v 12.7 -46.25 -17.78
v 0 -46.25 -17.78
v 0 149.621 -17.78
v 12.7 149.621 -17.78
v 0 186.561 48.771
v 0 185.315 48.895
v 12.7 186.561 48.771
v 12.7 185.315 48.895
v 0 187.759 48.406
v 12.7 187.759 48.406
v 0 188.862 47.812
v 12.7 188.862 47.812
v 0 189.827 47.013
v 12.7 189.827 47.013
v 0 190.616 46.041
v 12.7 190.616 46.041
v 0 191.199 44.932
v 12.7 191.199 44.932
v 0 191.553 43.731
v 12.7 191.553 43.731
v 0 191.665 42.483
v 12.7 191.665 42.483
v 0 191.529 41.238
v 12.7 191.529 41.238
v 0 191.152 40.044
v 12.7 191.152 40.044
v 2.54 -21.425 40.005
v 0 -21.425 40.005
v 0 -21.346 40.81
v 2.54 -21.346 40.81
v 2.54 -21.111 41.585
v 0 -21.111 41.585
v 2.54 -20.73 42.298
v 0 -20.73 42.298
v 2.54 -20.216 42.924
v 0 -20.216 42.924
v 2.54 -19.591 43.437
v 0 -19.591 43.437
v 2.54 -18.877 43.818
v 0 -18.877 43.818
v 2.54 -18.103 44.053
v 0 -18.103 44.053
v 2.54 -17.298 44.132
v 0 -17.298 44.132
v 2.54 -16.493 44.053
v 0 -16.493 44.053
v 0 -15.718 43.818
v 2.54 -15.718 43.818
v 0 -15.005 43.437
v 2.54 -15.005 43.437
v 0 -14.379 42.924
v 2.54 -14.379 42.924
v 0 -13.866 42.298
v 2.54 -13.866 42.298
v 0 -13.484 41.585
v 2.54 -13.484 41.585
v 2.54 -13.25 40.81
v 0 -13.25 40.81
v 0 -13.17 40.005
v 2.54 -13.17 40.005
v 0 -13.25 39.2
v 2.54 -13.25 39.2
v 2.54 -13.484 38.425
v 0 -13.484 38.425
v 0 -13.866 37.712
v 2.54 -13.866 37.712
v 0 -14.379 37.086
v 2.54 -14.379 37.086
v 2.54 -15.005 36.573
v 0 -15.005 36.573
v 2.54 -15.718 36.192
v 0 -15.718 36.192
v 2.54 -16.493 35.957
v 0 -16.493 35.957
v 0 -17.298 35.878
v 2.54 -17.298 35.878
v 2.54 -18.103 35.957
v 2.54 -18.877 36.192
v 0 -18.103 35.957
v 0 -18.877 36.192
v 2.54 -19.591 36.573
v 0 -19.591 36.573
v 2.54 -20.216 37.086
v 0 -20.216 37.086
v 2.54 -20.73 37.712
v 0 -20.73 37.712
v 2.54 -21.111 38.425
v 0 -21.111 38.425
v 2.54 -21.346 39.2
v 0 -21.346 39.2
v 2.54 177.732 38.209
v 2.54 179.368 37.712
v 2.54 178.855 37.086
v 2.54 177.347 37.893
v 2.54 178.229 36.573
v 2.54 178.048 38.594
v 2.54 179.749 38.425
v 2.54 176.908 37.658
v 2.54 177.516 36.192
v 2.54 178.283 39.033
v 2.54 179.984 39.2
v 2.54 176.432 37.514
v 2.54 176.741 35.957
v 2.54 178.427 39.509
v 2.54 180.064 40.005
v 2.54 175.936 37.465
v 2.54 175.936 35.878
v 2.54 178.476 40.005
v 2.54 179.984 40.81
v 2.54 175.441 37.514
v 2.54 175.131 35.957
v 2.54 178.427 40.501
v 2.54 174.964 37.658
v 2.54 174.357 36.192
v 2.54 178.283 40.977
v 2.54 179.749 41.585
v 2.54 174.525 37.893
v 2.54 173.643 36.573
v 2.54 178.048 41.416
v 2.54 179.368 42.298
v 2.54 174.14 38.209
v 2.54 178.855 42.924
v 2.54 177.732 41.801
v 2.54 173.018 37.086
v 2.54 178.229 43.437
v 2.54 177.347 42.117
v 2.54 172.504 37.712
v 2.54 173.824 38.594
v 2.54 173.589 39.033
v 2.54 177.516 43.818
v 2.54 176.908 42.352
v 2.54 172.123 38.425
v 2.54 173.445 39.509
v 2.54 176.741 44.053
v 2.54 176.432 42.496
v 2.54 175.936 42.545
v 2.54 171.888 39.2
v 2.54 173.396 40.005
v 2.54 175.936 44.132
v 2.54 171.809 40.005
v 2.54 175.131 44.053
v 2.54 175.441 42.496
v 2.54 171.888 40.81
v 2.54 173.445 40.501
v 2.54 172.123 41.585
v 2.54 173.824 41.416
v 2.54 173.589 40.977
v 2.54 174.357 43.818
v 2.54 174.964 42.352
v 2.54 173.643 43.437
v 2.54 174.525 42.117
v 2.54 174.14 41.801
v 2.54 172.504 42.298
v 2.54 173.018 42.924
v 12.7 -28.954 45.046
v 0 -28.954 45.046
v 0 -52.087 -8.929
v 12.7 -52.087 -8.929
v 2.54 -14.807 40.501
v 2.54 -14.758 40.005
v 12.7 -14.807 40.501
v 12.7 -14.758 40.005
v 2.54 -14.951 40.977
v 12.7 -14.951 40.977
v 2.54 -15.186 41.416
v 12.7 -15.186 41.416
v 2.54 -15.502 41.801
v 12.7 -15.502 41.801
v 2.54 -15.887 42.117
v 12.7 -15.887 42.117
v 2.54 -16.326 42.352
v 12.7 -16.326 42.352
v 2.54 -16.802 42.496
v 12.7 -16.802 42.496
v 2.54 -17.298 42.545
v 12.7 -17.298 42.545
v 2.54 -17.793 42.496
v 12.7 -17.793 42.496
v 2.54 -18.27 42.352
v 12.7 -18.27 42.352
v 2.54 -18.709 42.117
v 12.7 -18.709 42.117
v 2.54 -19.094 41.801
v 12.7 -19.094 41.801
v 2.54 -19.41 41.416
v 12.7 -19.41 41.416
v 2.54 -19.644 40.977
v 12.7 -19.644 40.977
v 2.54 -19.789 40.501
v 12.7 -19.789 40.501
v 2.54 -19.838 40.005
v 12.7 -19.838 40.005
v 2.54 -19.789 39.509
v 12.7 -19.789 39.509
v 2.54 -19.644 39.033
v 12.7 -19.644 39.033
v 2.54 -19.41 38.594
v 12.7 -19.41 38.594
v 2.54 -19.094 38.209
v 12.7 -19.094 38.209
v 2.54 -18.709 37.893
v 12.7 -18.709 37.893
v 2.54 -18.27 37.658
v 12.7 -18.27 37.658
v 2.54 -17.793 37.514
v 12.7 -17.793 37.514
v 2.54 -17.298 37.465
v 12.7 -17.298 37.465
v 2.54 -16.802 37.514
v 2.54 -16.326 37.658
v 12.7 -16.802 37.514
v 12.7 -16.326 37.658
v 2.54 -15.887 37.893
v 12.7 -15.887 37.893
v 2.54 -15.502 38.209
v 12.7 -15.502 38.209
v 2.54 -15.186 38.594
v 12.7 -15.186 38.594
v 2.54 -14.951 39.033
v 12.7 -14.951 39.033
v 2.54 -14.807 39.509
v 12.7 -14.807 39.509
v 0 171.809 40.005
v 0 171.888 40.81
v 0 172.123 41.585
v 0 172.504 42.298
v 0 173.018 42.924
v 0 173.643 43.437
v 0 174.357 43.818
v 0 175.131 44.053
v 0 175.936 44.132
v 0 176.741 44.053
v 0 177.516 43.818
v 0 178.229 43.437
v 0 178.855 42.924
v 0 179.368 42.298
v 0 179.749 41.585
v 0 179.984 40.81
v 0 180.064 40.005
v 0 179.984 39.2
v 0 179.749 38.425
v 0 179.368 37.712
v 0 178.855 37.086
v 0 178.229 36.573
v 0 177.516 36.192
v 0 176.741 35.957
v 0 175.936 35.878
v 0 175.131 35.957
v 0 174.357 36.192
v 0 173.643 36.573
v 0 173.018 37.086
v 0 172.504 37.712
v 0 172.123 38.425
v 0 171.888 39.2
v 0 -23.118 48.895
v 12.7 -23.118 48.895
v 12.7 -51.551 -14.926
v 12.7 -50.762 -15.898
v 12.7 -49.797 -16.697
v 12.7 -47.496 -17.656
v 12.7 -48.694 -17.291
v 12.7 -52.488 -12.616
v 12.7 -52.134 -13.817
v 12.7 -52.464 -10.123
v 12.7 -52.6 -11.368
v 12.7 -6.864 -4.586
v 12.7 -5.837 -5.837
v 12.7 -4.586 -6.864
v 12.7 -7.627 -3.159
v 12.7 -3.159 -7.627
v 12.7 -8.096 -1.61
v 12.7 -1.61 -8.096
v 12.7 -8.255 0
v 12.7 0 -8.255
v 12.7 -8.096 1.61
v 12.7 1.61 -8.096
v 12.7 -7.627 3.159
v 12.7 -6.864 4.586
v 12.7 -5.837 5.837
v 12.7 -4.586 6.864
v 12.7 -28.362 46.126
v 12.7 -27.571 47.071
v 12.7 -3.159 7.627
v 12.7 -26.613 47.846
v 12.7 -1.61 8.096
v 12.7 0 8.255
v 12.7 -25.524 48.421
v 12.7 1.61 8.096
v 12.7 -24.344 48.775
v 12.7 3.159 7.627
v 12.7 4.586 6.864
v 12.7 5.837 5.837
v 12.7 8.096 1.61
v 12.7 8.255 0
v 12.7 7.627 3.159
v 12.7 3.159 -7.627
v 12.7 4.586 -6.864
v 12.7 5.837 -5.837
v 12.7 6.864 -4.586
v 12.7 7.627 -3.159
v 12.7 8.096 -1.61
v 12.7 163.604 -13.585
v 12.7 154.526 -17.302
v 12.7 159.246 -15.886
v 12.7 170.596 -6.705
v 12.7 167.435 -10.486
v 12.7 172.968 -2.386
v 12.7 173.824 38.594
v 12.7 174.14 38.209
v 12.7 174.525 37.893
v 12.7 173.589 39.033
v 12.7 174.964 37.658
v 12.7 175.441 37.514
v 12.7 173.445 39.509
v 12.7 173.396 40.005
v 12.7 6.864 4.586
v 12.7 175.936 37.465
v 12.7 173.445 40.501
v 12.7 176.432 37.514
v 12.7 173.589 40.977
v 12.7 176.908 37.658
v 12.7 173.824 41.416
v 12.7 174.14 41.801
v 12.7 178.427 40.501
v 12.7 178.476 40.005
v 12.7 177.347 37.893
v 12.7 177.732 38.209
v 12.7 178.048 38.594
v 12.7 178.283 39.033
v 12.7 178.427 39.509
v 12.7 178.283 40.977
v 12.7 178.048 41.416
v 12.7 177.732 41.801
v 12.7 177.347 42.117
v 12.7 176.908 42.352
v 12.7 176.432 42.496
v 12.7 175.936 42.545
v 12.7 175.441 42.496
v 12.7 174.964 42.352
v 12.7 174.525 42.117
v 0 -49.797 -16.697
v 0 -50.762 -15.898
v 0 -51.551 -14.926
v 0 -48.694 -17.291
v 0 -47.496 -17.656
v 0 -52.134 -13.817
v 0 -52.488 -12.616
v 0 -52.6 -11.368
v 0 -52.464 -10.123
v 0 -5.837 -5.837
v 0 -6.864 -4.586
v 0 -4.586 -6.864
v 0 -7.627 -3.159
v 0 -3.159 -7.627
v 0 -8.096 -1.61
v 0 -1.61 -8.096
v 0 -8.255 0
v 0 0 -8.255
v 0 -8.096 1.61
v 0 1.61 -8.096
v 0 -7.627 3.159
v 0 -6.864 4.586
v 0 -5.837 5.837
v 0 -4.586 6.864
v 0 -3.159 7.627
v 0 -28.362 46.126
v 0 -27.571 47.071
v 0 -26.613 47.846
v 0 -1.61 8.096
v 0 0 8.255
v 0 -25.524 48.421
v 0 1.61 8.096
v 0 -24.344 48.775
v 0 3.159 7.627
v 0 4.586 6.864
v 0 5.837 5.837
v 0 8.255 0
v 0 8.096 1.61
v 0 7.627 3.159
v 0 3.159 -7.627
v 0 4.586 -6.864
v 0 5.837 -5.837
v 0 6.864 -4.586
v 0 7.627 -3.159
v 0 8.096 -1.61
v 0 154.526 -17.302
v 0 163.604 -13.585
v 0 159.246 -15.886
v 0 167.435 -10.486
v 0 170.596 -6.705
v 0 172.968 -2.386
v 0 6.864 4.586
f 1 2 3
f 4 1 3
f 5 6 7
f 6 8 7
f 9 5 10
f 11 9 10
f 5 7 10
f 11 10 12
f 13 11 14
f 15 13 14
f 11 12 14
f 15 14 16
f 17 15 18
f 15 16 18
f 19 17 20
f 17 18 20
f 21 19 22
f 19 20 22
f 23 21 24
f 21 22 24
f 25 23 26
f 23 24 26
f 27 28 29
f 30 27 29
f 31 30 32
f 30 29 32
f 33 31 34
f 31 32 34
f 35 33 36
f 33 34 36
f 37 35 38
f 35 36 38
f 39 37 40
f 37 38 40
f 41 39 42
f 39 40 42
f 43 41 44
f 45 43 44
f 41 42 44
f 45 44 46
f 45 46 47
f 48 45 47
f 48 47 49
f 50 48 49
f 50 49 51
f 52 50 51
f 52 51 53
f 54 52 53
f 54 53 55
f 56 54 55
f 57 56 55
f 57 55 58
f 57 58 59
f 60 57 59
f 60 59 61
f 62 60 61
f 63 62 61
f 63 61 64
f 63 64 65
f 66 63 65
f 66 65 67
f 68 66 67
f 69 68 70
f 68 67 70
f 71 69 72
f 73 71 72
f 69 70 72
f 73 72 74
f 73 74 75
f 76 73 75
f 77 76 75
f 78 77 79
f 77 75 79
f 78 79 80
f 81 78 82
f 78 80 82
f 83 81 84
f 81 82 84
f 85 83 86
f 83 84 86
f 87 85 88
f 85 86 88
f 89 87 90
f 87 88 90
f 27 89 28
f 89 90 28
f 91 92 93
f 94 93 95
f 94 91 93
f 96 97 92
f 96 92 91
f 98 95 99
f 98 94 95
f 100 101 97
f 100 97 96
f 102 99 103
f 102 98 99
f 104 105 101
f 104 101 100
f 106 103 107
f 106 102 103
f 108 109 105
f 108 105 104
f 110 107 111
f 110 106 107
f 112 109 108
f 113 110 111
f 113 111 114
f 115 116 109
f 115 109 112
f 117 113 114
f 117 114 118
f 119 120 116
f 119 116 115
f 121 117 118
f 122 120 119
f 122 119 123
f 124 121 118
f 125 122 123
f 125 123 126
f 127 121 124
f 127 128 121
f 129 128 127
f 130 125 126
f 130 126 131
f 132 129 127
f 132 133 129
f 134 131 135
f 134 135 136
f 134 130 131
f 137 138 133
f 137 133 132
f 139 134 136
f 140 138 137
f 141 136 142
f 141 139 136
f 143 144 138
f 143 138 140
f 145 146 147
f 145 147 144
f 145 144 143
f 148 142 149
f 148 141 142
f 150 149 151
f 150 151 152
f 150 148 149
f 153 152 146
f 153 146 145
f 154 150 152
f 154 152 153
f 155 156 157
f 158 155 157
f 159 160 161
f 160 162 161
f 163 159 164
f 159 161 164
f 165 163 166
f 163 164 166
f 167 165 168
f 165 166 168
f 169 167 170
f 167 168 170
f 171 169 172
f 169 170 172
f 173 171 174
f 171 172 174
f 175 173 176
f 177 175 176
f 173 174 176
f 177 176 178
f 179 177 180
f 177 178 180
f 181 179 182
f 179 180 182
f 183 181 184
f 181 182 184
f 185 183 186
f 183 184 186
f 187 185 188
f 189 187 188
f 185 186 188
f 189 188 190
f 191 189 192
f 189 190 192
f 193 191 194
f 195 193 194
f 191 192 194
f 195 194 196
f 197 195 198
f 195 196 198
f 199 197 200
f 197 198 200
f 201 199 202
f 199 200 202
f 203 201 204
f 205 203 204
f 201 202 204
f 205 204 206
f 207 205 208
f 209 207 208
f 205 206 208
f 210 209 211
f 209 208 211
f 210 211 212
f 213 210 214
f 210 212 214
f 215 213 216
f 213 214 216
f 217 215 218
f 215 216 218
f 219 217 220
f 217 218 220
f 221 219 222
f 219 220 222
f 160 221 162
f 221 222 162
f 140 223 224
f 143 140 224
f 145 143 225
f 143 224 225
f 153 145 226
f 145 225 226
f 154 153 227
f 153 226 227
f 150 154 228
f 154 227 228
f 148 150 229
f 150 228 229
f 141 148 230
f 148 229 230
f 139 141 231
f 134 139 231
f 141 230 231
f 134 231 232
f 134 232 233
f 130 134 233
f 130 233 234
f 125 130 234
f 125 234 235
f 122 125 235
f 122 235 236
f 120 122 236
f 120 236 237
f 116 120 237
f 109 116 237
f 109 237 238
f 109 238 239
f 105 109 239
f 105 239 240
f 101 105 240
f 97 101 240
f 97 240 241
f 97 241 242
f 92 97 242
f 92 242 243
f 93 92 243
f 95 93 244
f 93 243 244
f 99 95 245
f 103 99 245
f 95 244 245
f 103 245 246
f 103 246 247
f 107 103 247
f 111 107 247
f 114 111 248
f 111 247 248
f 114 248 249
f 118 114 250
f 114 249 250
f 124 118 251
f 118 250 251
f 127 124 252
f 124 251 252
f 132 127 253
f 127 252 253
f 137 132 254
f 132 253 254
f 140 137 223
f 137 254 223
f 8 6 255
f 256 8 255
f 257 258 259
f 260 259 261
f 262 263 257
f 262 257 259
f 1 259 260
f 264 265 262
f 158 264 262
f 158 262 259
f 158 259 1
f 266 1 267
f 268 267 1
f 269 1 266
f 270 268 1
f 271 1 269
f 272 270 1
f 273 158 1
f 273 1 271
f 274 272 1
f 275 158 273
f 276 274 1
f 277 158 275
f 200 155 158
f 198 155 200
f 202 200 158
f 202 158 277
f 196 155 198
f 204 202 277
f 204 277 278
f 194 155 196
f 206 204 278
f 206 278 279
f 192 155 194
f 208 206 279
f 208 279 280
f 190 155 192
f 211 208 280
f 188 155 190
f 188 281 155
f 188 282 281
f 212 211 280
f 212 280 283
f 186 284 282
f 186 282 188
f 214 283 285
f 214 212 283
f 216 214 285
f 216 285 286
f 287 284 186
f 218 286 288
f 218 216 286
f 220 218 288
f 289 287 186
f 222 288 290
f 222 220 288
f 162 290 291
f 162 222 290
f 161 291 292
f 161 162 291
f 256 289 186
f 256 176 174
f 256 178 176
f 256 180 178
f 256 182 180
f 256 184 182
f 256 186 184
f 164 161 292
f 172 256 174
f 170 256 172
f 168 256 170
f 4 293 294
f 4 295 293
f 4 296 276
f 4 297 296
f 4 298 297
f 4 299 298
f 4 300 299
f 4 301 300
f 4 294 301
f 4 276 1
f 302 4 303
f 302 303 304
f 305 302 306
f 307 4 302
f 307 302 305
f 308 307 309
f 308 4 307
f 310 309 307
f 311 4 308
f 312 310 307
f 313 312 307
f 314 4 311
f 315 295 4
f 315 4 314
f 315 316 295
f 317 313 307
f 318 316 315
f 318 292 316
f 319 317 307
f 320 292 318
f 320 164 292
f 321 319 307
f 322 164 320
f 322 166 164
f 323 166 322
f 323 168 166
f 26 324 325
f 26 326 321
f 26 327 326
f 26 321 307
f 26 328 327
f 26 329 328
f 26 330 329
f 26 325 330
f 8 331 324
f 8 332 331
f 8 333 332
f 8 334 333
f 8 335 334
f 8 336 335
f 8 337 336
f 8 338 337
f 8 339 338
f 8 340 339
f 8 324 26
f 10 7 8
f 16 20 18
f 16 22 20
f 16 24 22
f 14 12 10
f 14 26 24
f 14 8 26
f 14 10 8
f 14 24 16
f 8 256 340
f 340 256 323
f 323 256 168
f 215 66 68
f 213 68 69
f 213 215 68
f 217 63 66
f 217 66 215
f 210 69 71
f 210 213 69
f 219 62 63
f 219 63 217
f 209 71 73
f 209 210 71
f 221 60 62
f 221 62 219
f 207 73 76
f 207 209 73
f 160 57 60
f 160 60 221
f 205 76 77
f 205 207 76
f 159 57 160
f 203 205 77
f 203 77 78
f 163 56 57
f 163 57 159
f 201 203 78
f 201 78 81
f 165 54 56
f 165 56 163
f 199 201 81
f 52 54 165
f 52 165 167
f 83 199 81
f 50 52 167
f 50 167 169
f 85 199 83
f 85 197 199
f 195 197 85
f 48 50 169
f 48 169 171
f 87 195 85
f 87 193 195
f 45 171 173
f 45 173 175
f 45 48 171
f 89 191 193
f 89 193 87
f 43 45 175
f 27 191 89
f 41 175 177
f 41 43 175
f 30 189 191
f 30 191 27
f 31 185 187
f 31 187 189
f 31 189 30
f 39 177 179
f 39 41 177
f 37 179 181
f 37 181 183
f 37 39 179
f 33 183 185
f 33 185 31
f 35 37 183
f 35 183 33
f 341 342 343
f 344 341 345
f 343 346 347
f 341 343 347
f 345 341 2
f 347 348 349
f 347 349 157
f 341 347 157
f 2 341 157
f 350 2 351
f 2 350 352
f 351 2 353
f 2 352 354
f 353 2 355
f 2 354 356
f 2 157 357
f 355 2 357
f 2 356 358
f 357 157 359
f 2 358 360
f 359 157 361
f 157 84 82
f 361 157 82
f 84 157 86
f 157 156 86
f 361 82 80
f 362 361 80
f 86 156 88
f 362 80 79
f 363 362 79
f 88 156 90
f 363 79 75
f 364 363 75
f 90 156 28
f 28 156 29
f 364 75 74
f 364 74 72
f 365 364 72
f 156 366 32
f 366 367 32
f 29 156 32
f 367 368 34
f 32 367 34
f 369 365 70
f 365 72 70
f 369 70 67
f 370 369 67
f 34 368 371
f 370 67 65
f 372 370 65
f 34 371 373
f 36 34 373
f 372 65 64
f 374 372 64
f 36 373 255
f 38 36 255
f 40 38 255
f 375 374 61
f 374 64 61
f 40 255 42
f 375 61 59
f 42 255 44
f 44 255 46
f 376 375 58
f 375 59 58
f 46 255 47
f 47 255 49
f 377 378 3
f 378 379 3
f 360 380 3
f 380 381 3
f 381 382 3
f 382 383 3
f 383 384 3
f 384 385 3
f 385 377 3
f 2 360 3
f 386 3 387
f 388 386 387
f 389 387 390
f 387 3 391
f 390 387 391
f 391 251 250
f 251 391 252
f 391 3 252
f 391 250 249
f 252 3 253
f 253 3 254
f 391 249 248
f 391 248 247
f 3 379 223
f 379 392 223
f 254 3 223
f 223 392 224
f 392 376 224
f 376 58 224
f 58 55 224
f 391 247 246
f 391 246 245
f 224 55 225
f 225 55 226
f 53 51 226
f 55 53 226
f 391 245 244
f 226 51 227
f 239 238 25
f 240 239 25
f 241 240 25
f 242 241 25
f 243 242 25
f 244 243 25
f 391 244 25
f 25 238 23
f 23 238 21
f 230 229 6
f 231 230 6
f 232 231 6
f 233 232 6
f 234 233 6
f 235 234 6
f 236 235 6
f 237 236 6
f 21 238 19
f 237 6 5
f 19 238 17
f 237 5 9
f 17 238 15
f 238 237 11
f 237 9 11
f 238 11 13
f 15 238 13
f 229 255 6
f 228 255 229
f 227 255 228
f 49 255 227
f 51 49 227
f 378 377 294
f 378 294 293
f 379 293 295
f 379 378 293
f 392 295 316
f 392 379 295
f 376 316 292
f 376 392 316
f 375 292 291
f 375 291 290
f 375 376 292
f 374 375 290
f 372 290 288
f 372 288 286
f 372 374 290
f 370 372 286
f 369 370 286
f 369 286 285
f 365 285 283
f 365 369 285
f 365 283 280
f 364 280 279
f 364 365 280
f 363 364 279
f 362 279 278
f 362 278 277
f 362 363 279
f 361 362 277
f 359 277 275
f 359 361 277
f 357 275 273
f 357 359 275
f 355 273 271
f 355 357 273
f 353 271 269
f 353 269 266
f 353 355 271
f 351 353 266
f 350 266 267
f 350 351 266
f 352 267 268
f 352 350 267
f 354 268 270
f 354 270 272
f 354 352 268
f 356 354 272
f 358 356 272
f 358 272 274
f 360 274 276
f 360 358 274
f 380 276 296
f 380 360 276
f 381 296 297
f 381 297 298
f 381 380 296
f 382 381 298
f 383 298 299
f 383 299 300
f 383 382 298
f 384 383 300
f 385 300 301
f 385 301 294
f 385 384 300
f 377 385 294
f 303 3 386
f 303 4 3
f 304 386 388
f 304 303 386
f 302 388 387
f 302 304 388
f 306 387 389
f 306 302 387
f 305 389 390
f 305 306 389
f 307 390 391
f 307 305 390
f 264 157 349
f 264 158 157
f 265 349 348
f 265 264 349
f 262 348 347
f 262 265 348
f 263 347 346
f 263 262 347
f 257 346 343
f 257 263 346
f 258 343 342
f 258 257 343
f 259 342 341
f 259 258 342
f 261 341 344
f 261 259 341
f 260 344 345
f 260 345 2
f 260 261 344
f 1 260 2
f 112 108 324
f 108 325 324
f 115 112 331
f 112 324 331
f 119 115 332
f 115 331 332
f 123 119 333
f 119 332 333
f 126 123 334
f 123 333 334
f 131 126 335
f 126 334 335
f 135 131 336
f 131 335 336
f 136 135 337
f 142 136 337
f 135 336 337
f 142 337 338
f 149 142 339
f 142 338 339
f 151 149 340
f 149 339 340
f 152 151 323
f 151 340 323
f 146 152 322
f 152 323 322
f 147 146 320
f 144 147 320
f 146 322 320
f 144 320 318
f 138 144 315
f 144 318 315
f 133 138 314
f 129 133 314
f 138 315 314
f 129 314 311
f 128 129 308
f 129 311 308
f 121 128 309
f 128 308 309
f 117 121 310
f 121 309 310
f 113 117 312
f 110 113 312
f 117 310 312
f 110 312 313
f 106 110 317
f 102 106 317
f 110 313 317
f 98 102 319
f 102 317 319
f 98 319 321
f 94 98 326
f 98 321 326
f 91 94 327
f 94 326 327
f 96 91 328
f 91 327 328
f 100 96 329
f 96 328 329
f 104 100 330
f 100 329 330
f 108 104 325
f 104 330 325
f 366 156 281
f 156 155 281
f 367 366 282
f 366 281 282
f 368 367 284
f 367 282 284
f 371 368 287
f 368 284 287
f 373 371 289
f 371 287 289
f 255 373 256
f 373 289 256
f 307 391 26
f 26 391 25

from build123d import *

# Parameters (mm, degrees)
F0_R           = 8.255
F1_DEPTH       = 12.7
F3_D           = 5.08
F3_CBORE_D     = 8.255
F3_CBORE_DEPTH = 2.54
F4_R           = 6.35
F5_R           = 25.4


with BuildPart() as f1:
    # F0 (on Right) → F1 (new body)
    with BuildSketch(Plane.YZ):
        Polygon((-27.305, 48.895), (-55.88, -17.78), (166.37, -17.78), (194.945, 48.895), align=None)
        Circle(F0_R, mode=Mode.SUBTRACT)
    extrude(amount=F1_DEPTH)

    # F3 (through all)
    with Locations(Plane(origin=(0, 0, 0), x_dir=(0, -1, 0), z_dir=(-1, 0, 0))):
        with Locations((-175.936093, 40.005), (17.297812, 40.005)):
            CounterBoreHole(F3_D / 2, F3_CBORE_D / 2, F3_CBORE_DEPTH)

    # F4
    f4_edges = [f1.edges().sort_by_distance(p)[0] for p in [
        (6.35, 194.945, 48.895),
        (6.35, -27.305, 48.895),
        (6.35, -55.88, -17.78),
    ]]
    fillet(f4_edges, radius=F4_R)

    # F5
    f5_edges = [f1.edges().sort_by_distance(p)[0] for p in [
        (6.35, 166.37, -17.78),
    ]]
    fillet(f5_edges, radius=F5_R)


solid = f1.part
